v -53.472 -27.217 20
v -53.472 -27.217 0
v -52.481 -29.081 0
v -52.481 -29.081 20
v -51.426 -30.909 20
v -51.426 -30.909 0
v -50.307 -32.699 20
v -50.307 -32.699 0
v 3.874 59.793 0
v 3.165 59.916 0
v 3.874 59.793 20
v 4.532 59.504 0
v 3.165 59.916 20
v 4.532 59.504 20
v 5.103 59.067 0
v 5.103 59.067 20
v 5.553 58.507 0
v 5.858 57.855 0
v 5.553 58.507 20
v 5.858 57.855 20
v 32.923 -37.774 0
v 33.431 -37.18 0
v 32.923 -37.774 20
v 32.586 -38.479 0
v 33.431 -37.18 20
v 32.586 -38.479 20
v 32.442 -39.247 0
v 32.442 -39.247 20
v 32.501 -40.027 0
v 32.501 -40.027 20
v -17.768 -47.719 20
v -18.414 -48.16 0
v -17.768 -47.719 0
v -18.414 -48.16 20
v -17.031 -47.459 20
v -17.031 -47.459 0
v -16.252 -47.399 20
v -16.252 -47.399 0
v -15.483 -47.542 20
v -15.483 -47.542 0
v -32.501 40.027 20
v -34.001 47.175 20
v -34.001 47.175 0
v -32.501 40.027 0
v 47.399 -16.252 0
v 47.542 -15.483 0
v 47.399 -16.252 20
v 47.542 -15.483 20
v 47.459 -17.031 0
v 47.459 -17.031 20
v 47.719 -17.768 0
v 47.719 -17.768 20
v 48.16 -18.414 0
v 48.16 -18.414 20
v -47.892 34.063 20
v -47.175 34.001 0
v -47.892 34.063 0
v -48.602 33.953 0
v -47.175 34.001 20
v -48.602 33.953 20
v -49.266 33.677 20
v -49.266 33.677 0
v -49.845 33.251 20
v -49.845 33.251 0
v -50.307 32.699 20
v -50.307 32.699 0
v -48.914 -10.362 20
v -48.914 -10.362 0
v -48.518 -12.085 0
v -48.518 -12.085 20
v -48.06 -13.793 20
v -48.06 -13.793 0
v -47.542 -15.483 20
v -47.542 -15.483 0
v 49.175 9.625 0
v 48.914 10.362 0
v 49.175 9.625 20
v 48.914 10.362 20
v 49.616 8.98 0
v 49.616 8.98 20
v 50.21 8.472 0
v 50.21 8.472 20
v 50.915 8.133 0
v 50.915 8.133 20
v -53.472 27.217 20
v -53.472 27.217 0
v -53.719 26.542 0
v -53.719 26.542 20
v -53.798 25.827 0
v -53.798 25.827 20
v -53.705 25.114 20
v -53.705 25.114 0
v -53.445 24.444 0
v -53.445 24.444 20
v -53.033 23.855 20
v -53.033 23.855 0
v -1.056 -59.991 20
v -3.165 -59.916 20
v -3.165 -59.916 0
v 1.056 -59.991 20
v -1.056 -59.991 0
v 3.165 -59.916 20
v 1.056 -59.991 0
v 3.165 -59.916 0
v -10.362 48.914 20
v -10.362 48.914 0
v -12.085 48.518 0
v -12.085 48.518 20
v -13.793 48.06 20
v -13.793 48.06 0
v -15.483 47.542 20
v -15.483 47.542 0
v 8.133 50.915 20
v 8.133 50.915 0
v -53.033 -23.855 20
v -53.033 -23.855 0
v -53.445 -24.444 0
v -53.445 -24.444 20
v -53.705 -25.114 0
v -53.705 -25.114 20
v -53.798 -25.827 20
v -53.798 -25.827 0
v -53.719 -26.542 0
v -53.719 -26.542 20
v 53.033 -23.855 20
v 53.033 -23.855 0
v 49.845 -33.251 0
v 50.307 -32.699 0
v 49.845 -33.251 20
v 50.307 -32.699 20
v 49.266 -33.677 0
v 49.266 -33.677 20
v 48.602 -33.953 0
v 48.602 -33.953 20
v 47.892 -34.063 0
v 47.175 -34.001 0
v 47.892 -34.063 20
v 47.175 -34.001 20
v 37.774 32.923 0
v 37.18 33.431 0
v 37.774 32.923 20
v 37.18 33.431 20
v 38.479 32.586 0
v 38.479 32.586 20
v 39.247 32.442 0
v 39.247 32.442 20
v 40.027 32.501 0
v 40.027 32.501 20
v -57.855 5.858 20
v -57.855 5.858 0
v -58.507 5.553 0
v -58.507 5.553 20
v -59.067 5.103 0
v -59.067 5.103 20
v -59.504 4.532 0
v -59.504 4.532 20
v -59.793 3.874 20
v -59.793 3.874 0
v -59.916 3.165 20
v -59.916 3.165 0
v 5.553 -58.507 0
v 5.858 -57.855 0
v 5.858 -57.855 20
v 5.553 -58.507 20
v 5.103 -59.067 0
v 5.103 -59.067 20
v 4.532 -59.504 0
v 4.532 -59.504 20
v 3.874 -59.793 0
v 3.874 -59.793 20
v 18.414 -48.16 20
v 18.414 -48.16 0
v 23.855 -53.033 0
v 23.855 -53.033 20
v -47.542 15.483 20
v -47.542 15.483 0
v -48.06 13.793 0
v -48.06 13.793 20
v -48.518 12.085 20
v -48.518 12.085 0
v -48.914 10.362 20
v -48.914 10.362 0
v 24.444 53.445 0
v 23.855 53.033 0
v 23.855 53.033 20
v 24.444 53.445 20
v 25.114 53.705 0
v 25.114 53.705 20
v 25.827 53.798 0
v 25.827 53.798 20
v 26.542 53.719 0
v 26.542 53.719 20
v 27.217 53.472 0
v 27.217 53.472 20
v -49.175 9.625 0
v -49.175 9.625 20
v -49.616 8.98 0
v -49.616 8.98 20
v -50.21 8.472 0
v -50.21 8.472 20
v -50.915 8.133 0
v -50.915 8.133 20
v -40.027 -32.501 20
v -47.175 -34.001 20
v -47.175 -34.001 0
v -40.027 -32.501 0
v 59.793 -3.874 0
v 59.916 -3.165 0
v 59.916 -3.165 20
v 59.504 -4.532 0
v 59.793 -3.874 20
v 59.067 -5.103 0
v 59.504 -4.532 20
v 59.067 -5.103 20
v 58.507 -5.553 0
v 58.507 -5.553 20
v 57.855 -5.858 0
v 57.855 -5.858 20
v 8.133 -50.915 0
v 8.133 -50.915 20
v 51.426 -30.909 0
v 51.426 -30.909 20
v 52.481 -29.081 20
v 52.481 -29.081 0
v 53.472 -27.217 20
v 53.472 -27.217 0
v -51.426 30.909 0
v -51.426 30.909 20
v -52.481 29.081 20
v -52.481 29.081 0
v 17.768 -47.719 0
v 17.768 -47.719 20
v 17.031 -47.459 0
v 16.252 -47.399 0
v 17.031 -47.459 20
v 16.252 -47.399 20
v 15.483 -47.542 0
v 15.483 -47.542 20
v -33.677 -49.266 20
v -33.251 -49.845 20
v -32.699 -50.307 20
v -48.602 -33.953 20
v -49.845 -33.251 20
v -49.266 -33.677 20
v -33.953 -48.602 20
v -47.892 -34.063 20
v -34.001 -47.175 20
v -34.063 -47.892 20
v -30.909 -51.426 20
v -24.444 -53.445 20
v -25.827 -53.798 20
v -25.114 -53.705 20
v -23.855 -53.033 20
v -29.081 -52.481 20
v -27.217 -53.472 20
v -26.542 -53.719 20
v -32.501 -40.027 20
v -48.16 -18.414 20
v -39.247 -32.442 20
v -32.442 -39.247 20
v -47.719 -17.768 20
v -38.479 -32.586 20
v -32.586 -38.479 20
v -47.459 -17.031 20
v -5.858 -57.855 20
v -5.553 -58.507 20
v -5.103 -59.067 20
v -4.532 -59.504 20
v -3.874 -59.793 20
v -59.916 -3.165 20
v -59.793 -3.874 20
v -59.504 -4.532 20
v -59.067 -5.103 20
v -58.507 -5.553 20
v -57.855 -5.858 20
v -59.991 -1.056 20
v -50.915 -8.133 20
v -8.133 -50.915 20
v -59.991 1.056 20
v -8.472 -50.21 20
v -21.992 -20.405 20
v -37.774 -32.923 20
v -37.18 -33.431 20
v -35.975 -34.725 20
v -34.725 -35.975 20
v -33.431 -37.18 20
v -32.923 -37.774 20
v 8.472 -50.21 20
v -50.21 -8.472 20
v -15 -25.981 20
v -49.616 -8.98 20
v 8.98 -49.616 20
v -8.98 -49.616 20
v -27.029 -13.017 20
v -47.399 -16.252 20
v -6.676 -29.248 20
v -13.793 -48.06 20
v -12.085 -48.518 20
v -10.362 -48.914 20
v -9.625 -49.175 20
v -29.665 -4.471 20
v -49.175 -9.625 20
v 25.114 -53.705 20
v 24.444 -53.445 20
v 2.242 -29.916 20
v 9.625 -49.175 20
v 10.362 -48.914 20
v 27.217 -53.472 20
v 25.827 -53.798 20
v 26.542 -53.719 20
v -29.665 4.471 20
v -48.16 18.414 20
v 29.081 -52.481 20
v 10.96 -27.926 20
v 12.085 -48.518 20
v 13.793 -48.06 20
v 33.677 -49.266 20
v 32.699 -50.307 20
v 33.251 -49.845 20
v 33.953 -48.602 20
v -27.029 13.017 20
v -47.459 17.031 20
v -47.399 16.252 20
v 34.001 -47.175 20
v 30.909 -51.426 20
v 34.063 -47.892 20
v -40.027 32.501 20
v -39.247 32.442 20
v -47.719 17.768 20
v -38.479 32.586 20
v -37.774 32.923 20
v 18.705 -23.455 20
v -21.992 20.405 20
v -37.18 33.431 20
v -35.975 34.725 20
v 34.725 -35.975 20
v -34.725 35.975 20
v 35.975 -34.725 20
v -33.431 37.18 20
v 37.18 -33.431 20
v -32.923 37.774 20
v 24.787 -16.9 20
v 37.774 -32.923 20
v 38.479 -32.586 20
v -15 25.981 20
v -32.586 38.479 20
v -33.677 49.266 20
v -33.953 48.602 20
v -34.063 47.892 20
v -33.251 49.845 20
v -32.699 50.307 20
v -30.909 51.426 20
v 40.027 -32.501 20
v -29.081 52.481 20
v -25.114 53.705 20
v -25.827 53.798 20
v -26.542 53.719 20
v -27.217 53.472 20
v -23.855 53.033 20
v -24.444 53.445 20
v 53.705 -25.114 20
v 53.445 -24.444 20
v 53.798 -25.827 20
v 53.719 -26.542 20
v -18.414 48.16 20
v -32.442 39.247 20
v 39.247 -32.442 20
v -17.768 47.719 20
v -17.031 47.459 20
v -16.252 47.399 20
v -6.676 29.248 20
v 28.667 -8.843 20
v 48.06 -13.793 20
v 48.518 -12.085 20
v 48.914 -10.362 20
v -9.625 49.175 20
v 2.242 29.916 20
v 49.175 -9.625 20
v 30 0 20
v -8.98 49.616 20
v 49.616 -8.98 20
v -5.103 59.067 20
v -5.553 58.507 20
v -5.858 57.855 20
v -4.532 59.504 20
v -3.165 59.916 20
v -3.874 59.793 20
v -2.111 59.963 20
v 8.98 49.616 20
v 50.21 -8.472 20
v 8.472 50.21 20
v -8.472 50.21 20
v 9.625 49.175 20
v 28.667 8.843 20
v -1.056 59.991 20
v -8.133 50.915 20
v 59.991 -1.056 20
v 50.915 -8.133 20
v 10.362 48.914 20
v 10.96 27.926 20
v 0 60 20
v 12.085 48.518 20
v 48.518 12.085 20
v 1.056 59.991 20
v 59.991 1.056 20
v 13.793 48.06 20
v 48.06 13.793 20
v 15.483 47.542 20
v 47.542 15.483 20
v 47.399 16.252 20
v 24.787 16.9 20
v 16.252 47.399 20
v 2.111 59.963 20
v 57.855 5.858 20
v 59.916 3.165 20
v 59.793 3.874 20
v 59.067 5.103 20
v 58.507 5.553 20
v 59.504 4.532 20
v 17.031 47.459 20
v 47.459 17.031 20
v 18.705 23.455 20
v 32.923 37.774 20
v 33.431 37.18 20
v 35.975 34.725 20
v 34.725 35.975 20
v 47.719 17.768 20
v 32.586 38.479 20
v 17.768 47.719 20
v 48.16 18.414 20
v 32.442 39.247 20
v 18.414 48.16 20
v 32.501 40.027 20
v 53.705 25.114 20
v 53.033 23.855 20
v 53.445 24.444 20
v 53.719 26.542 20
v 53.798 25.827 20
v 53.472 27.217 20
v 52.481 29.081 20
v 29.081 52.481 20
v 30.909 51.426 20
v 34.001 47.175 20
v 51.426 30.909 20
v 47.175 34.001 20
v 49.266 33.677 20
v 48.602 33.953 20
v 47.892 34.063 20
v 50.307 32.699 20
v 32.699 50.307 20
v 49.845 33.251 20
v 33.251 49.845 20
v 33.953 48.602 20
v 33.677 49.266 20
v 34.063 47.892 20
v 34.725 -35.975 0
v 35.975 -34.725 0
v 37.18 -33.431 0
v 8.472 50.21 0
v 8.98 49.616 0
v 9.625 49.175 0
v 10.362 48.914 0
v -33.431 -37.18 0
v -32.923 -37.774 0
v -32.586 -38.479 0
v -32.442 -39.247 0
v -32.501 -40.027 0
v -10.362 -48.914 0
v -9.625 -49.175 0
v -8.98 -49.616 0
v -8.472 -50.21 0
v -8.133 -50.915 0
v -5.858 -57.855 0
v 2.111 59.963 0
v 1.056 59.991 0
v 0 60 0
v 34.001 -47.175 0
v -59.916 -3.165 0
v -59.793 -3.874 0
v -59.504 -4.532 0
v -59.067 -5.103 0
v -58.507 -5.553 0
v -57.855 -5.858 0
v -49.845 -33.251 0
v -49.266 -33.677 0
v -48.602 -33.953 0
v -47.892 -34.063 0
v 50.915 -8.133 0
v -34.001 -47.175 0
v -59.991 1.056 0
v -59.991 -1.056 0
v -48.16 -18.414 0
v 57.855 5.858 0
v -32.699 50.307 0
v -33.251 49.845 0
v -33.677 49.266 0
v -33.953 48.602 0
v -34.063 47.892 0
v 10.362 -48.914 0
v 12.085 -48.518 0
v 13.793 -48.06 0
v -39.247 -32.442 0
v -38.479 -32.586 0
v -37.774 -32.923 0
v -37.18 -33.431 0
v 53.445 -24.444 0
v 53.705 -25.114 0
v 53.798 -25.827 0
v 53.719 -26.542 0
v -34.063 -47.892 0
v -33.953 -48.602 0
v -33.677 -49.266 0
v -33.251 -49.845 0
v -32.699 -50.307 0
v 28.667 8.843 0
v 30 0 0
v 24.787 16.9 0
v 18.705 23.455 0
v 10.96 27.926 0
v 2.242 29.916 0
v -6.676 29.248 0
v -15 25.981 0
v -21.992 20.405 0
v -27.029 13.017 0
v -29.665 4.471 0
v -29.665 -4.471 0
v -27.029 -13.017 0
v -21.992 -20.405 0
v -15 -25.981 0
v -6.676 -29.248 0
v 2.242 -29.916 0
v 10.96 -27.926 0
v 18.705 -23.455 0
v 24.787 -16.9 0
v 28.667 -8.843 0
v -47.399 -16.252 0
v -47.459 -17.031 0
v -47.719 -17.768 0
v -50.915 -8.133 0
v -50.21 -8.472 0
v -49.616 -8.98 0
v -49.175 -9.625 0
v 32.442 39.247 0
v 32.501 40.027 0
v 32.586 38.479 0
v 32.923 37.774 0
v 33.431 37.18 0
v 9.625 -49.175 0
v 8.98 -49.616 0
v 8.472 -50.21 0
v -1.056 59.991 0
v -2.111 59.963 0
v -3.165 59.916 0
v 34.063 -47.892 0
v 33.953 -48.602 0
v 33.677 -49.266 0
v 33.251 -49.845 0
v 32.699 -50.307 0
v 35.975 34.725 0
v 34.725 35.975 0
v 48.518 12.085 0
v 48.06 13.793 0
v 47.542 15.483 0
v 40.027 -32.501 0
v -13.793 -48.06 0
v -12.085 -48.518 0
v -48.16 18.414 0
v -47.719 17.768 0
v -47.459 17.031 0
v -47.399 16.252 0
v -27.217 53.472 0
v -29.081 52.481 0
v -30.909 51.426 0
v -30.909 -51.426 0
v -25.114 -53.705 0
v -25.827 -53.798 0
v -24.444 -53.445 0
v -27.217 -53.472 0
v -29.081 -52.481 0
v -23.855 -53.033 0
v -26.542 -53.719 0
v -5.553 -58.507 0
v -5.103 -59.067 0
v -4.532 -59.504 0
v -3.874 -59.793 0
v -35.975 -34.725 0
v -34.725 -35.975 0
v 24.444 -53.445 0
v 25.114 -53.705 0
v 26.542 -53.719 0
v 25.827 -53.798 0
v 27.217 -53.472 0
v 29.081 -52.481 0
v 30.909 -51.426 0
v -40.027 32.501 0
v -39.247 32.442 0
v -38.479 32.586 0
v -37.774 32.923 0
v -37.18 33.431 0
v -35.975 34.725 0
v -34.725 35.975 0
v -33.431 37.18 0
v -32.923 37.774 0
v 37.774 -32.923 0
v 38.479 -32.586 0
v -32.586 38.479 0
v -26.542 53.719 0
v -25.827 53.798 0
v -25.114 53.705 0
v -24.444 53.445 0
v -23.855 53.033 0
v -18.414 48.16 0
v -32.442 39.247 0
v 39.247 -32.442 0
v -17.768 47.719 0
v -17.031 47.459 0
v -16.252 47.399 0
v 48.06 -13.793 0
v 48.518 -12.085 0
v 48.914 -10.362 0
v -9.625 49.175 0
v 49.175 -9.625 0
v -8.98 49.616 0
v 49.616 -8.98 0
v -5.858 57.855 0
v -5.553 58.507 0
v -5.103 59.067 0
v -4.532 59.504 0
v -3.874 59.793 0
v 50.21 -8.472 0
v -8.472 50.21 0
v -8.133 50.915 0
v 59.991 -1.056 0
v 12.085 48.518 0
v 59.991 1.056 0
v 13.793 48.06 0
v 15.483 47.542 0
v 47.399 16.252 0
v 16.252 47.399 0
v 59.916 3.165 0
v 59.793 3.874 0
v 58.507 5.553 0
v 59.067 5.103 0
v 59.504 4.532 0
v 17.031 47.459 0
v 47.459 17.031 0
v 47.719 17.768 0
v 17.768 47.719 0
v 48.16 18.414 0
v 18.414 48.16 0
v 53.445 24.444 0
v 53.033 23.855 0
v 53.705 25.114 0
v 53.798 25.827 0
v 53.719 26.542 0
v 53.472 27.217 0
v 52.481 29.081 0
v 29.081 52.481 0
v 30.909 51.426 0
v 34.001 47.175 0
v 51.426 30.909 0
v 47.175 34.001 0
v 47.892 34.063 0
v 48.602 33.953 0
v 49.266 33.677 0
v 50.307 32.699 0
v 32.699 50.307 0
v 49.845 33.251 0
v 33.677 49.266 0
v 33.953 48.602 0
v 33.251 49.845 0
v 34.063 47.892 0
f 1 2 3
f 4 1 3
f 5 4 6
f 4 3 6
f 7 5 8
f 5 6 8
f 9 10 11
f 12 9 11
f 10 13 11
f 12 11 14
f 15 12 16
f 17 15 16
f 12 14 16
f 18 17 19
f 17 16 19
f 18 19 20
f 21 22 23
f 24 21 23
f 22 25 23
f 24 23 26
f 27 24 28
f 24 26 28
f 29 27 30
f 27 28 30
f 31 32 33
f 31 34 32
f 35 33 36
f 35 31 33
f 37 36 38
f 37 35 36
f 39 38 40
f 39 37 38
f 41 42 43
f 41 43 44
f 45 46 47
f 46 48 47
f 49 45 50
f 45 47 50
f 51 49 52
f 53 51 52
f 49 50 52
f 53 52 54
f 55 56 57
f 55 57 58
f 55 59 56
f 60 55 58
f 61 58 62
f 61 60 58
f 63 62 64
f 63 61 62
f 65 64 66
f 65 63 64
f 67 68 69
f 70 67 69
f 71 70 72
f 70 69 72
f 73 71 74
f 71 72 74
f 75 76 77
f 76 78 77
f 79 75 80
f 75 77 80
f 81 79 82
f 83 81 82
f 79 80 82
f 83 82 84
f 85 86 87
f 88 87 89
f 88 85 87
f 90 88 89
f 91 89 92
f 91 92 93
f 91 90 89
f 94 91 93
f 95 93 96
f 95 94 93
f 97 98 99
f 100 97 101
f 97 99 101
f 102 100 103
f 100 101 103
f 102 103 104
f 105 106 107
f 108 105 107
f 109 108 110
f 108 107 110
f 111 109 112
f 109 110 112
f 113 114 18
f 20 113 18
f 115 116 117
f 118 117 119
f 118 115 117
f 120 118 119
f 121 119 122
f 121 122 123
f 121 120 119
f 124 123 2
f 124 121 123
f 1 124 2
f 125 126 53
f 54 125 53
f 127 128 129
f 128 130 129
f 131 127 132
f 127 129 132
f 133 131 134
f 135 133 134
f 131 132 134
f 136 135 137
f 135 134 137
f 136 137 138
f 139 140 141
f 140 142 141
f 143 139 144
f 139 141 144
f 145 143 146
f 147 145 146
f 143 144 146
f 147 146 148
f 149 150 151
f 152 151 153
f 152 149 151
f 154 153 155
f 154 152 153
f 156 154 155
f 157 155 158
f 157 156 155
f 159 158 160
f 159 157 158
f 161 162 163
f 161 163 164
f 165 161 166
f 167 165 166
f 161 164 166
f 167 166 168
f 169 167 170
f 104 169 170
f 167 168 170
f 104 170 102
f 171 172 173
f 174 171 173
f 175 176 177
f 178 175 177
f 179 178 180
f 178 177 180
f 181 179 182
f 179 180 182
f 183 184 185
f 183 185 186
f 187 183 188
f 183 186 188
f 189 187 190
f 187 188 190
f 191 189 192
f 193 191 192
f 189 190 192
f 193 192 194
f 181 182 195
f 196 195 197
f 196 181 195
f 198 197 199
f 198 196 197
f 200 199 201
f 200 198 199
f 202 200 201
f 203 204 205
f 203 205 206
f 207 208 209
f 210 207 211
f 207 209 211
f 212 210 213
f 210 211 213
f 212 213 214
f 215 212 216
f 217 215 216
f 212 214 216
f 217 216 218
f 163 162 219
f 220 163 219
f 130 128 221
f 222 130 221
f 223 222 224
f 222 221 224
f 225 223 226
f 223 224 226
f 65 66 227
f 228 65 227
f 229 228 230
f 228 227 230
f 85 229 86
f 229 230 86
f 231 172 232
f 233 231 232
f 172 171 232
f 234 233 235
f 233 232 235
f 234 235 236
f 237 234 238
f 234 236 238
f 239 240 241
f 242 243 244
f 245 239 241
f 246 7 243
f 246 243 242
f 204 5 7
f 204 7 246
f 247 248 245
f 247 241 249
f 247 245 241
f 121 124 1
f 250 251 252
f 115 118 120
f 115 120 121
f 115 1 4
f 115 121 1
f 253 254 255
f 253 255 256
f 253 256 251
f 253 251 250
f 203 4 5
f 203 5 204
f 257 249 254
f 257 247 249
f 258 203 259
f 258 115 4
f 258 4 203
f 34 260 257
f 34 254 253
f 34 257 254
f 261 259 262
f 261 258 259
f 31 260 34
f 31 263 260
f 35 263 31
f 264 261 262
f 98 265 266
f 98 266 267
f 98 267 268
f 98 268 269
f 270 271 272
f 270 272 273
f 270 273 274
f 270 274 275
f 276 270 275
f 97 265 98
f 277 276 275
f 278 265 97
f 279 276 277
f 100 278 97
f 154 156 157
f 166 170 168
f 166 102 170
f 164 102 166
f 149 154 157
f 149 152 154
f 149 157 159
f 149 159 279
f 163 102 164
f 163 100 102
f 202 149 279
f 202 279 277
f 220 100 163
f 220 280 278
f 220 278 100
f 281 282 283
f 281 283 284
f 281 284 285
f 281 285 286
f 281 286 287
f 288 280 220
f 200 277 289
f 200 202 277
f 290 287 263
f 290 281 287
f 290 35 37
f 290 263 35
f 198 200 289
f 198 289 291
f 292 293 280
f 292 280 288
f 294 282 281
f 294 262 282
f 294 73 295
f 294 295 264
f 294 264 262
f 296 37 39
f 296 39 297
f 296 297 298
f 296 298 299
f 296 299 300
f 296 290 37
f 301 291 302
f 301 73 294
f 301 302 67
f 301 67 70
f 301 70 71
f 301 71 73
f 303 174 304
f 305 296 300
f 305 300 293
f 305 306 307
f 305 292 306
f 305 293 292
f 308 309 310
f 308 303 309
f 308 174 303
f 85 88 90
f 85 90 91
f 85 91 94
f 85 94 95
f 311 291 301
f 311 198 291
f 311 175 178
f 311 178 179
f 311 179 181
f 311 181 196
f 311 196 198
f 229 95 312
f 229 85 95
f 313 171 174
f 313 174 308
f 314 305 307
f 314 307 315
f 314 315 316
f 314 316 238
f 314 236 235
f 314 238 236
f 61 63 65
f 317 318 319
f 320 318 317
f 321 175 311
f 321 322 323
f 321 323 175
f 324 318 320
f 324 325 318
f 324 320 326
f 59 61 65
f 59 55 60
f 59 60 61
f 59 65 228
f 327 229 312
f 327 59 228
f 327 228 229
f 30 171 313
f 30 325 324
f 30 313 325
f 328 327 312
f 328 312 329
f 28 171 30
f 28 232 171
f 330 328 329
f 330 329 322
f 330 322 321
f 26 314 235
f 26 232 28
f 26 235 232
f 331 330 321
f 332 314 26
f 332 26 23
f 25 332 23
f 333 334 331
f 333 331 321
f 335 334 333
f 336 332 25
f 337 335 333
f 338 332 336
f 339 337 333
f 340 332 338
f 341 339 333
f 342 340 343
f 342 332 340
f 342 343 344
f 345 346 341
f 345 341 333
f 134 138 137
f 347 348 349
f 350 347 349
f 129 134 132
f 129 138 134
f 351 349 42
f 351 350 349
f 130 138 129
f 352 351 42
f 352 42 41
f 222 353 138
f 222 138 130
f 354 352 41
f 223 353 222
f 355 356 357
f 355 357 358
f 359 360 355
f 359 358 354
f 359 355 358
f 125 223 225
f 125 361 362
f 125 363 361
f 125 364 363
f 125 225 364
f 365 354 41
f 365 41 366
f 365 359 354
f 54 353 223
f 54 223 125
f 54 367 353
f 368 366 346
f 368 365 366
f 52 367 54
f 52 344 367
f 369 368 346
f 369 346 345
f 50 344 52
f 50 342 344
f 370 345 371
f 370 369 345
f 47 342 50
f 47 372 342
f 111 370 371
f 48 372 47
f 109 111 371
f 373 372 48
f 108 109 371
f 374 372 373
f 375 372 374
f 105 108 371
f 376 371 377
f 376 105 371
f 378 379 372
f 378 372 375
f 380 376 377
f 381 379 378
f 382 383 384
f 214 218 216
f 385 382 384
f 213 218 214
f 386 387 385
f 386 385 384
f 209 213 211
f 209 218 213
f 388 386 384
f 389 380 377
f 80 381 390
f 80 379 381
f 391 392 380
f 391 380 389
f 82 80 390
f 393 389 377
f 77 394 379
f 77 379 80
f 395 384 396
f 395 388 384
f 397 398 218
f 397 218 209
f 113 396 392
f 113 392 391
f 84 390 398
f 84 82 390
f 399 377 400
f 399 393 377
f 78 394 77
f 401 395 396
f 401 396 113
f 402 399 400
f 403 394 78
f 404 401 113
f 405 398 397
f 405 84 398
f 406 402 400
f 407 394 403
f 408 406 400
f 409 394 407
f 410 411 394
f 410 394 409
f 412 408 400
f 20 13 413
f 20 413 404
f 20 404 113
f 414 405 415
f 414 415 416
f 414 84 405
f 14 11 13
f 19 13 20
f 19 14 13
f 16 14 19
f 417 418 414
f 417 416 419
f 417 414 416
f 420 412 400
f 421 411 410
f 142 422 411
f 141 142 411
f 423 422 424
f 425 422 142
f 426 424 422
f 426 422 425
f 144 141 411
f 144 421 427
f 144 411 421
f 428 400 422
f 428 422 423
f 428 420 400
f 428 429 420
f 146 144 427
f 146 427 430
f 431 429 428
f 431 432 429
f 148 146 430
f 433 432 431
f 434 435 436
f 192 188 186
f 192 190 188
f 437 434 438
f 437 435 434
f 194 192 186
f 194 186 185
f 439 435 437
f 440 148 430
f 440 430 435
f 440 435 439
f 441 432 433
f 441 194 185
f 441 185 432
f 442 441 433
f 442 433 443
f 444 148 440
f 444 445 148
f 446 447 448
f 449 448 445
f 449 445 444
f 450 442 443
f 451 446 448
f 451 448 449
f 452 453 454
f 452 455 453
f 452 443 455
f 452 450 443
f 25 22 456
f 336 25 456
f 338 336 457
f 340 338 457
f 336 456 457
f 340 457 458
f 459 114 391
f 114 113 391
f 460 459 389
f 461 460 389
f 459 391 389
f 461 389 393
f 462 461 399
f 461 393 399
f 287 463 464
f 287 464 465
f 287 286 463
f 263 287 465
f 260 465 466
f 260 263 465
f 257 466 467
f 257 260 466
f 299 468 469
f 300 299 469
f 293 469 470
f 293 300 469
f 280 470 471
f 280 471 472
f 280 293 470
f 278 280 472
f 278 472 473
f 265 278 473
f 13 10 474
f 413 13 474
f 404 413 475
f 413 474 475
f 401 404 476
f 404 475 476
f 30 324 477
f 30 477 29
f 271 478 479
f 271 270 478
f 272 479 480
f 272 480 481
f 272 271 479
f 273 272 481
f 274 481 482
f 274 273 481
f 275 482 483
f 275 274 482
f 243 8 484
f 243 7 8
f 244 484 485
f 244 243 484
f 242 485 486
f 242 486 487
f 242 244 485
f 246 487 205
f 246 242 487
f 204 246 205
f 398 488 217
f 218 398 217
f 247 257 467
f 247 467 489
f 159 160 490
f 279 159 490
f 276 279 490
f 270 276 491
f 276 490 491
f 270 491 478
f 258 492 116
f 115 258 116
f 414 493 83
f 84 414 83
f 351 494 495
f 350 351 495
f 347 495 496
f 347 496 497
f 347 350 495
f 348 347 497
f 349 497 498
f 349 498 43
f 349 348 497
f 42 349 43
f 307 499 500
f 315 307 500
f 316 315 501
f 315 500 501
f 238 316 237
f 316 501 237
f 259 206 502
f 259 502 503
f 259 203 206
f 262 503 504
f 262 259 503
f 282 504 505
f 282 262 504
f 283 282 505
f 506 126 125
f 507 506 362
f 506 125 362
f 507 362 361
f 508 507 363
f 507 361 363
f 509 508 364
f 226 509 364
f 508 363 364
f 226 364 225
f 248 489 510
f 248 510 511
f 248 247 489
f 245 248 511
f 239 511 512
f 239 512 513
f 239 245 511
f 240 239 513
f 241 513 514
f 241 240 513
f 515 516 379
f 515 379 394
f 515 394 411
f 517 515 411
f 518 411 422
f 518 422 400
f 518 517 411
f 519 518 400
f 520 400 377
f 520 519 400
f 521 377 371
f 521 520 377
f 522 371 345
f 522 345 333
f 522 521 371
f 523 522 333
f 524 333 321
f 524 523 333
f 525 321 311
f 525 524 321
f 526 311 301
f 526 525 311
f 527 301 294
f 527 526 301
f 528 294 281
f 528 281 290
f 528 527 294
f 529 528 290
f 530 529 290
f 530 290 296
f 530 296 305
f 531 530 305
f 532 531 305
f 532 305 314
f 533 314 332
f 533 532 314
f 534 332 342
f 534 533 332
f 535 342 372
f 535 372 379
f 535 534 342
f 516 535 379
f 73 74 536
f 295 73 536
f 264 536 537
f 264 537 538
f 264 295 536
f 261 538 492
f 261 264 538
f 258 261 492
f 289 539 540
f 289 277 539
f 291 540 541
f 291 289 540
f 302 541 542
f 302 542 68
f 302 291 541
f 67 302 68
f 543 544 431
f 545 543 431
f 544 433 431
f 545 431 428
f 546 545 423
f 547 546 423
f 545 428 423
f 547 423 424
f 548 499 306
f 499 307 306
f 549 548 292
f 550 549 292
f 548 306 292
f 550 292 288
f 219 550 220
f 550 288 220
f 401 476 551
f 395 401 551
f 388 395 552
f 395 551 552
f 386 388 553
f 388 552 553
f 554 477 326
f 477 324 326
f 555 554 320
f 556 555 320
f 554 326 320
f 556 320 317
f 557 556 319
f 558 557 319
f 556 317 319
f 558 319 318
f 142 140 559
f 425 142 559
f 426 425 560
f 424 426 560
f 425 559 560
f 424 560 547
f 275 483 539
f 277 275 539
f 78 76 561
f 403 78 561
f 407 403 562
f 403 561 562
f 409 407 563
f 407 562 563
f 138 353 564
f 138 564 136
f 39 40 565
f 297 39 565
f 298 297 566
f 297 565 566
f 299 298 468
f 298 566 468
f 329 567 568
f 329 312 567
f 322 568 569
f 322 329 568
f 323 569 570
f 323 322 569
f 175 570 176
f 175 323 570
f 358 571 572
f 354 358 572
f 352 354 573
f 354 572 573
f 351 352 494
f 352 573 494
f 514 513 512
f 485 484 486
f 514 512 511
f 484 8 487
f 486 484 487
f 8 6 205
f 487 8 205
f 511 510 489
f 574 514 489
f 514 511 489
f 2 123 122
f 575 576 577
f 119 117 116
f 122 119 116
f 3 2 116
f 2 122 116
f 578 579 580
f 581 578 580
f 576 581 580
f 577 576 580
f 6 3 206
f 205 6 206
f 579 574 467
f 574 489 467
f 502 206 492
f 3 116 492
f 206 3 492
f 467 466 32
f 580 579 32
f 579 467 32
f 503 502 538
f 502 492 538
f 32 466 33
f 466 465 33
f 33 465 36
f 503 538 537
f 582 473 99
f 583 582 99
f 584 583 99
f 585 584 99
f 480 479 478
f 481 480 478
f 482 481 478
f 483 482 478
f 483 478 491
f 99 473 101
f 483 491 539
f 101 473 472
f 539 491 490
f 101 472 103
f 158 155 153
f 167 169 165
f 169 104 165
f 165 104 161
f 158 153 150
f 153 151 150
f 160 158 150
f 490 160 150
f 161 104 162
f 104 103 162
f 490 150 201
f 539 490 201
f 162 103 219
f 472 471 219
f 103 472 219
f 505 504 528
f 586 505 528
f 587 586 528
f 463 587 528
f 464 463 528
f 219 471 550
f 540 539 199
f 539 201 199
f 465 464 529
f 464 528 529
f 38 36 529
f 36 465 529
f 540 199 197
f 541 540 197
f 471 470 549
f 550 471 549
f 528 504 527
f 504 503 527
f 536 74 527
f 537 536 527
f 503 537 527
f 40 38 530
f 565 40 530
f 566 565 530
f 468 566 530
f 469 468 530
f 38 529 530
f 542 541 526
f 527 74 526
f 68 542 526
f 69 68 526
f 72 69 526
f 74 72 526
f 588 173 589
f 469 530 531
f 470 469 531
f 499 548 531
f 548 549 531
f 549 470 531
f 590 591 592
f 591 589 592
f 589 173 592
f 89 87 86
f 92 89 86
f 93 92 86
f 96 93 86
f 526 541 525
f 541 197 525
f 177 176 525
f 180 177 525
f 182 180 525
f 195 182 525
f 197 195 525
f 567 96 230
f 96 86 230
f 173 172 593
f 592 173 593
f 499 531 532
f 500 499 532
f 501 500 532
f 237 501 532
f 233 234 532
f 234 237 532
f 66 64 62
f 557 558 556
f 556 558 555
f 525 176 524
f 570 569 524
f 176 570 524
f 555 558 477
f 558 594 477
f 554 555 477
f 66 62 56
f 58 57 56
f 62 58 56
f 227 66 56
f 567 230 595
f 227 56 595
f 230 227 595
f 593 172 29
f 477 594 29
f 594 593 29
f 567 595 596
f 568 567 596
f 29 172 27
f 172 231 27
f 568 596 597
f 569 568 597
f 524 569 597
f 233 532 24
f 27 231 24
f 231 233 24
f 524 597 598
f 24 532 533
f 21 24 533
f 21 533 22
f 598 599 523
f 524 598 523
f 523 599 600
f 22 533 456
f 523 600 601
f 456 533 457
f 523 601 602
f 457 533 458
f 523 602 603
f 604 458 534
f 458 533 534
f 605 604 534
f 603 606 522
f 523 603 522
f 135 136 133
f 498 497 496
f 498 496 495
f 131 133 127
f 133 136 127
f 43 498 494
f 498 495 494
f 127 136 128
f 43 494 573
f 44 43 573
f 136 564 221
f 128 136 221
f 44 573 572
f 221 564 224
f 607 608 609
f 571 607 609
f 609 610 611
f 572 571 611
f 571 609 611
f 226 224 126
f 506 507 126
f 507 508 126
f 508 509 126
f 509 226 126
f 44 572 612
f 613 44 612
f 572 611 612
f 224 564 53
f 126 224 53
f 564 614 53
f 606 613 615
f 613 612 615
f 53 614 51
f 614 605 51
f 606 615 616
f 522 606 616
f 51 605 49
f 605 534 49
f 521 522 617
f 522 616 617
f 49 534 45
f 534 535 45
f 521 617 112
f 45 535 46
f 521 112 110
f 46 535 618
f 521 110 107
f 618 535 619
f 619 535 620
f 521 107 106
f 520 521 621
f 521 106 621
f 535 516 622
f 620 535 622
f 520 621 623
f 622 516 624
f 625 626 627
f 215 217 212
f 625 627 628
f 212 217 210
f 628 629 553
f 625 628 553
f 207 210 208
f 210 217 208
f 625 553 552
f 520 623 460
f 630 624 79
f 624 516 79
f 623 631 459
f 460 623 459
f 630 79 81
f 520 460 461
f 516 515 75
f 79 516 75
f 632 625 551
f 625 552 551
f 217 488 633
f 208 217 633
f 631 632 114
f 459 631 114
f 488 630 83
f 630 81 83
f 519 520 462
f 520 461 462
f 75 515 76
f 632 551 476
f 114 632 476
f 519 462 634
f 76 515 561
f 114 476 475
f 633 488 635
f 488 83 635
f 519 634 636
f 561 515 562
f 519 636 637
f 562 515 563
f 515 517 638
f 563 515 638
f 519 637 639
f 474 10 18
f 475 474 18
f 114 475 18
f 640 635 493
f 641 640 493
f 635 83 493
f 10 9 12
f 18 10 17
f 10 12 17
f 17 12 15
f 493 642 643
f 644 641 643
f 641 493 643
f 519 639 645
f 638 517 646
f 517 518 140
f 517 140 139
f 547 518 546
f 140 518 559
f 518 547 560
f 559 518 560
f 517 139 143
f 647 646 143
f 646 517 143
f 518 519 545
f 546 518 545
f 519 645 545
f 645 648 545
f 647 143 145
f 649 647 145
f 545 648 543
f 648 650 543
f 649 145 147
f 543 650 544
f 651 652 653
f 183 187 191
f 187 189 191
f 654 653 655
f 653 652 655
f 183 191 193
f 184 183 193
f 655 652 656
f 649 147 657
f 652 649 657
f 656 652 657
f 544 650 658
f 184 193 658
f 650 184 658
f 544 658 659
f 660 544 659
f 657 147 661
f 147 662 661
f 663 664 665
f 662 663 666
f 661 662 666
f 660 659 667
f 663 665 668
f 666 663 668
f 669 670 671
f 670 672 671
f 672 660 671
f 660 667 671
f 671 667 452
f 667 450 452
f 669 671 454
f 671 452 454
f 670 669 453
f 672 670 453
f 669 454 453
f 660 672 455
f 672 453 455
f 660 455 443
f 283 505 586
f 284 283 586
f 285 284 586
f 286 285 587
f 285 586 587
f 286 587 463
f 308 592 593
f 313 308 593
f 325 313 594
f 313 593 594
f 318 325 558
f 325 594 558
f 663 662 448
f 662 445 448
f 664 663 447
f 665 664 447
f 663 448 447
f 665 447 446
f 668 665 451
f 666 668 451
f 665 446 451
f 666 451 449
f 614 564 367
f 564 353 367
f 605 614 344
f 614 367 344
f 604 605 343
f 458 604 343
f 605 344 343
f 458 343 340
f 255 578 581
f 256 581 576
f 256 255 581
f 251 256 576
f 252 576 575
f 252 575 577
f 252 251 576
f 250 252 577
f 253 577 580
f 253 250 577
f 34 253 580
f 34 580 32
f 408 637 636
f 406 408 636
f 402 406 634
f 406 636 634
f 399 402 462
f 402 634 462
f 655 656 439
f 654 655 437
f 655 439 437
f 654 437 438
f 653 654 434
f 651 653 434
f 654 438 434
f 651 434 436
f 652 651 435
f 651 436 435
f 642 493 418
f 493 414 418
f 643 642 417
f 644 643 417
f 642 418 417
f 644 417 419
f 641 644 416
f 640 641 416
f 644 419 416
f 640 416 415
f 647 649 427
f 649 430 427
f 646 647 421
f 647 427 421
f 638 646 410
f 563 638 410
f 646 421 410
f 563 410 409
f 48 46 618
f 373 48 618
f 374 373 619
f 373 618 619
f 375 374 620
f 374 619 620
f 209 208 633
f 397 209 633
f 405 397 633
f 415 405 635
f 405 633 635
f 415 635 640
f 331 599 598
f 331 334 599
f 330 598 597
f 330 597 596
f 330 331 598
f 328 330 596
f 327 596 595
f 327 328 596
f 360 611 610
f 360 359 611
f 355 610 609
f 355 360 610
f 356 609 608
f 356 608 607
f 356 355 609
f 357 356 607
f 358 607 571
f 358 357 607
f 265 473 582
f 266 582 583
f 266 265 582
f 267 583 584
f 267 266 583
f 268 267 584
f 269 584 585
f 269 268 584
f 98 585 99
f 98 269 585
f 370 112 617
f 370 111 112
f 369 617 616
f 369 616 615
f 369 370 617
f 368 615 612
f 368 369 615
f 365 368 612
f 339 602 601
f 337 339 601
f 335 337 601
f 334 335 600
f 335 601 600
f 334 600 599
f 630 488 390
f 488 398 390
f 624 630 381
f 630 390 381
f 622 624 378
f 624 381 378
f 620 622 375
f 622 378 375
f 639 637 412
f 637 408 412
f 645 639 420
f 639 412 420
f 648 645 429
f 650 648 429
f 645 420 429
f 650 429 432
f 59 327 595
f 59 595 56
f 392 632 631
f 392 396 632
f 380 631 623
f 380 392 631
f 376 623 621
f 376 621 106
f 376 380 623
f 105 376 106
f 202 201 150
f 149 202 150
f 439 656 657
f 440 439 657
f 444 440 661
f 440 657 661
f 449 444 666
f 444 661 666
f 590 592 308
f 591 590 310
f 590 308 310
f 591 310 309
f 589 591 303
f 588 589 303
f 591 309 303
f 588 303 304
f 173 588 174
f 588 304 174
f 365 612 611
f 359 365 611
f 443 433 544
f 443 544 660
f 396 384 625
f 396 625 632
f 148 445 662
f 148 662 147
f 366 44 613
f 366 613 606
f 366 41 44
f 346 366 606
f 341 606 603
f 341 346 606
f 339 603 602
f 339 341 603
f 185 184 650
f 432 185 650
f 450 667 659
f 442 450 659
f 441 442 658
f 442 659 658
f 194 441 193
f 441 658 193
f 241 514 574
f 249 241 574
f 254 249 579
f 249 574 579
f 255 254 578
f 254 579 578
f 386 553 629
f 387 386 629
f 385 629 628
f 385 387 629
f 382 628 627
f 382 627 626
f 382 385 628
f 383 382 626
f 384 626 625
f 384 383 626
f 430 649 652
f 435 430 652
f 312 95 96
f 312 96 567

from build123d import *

# Parameters (mm, degrees)
SKETCH1_R           = 30
BOSS_EXTRUDE1_DEPTH = 20
FILLET1_R           = 3


with BuildPart() as part:
    # Sketch1 → Boss-Extrude1 (new body)
    with BuildSketch(Plane.XY):
        with BuildLine():
            ThreePointArc((0, 60), (-2.617163242, 59.942893295), (-5.229344565, 59.771681886))
            Line((-5.229344565, 59.771681886), (-8.682408883, 49.240387651))
            ThreePointArc((-8.682408883, 49.240387651), (-12.940952255, 48.296291314), (-17.101007166, 46.984631039))
            Line((-17.101007166, 46.984631039), (-25.357095704, 54.378467222))
            ThreePointArc((-25.357095704, 54.378467222), (-30, 51.961524227), (-34.414586181, 49.149122657))
            Line((-34.414586181, 49.149122657), (-32.139380484, 38.302222156))
            ThreePointArc((-32.139380484, 38.302222156), (-35.355339059, 35.355339059), (-38.302222156, 32.139380484))
            Line((-38.302222156, 32.139380484), (-49.149122657, 34.414586181))
            ThreePointArc((-49.149122657, 34.414586181), (-51.961524227, 30), (-54.378467222, 25.357095704))
            Line((-54.378467222, 25.357095704), (-46.984631039, 17.101007166))
            ThreePointArc((-46.984631039, 17.101007166), (-48.296291314, 12.940952255), (-49.240387651, 8.682408883))
            Line((-49.240387651, 8.682408883), (-59.771681886, 5.229344565))
            ThreePointArc((-59.771681886, 5.229344565), (-60, 0), (-59.771681886, -5.229344565))
            Line((-59.771681886, -5.229344565), (-49.240387651, -8.682408883))
            ThreePointArc((-49.240387651, -8.682408883), (-48.296291314, -12.940952255), (-46.984631039, -17.101007166))
            Line((-46.984631039, -17.101007166), (-54.378467222, -25.357095704))
            ThreePointArc((-54.378467222, -25.357095704), (-51.961524227, -30), (-49.149122657, -34.414586181))
            Line((-49.149122657, -34.414586181), (-38.302222156, -32.139380484))
            ThreePointArc((-38.302222156, -32.139380484), (-35.355339059, -35.355339059), (-32.139380484, -38.302222156))
            Line((-32.139380484, -38.302222156), (-34.414586181, -49.149122657))
            ThreePointArc((-34.414586181, -49.149122657), (-30, -51.961524227), (-25.357095704, -54.378467222))
            Line((-25.357095704, -54.378467222), (-17.101007166, -46.984631039))
            ThreePointArc((-17.101007166, -46.984631039), (-12.940952255, -48.296291314), (-8.682408883, -49.240387651))
            Line((-8.682408883, -49.240387651), (-5.229344565, -59.771681886))
            ThreePointArc((-5.229344565, -59.771681886), (0, -60), (5.229344565, -59.771681886))
            Line((5.229344565, -59.771681886), (8.682408883, -49.240387651))
            ThreePointArc((8.682408883, -49.240387651), (12.940952255, -48.296291314), (17.101007166, -46.984631039))
            Line((17.101007166, -46.984631039), (25.357095704, -54.378467222))
            ThreePointArc((25.357095704, -54.378467222), (30, -51.961524227), (34.414586181, -49.149122657))
            Line((34.414586181, -49.149122657), (32.139380484, -38.302222156))
            ThreePointArc((32.139380484, -38.302222156), (35.355339059, -35.355339059), (38.302222156, -32.139380484))
            Line((38.302222156, -32.139380484), (49.149122657, -34.414586181))
            ThreePointArc((49.149122657, -34.414586181), (51.961524227, -30), (54.378467222, -25.357095704))
            Line((54.378467222, -25.357095704), (46.984631039, -17.101007166))
            ThreePointArc((46.984631039, -17.101007166), (48.296291314, -12.940952255), (49.240387651, -8.682408883))
            Line((49.240387651, -8.682408883), (59.771681886, -5.229344565))
            ThreePointArc((59.771681886, -5.229344565), (60, 0), (59.771681886, 5.229344565))
            Line((59.771681886, 5.229344565), (49.240387651, 8.682408883))
            ThreePointArc((49.240387651, 8.682408883), (48.296291314, 12.940952255), (46.984631039, 17.101007166))
            Line((46.984631039, 17.101007166), (54.378467222, 25.357095704))
            ThreePointArc((54.378467222, 25.357095704), (51.961524227, 30), (49.149122657, 34.414586181))
            Line((49.149122657, 34.414586181), (38.302222156, 32.139380484))
            ThreePointArc((38.302222156, 32.139380484), (35.355339059, 35.355339059), (32.139380484, 38.302222156))
            Line((32.139380484, 38.302222156), (34.414586181, 49.149122657))
            ThreePointArc((34.414586181, 49.149122657), (30, 51.961524227), (25.357095704, 54.378467222))
            Line((25.357095704, 54.378467222), (17.101007166, 46.984631039))
            ThreePointArc((17.101007166, 46.984631039), (12.940952255, 48.296291314), (8.682408883, 49.240387651))
            Line((8.682408883, 49.240387651), (5.229344565, 59.771681886))
            ThreePointArc((5.229344565, 59.771681886), (2.617163242, 59.942893295), (0, 60))
        make_face()
        Circle(SKETCH1_R, mode=Mode.SUBTRACT)
    extrude(amount=BOSS_EXTRUDE1_DEPTH)

    # Fillet1
    fillet1_edges = [part.edges().sort_by_distance(p)[0] for p in [
        (-34.414586181, 49.149122657, 10),
        (-25.357095704, 54.378467222, 10),
        (-17.101007166, 46.984631039, 10),
        (-8.682408883, 49.240387651, 10),
        (-5.229344565, 59.771681886, 10),
        (5.229344565, 59.771681886, 10),
        (8.682408883, 49.240387651, 10),
        (17.101007166, 46.984631039, 10),
        (25.357095704, 54.378467222, 10),
        (34.414586181, 49.149122657, 10),
        (32.139380484, 38.302222156, 10),
        (38.302222156, 32.139380484, 10),
        (49.149122657, 34.414586181, 10),
        (54.378467222, 25.357095704, 10),
        (46.984631039, 17.101007166, 10),
        (49.240387651, 8.682408883, 10),
        (59.771681886, 5.229344565, 10),
        (59.771681886, -5.229344565, 10),
        (49.240387651, -8.682408883, 10),
        (46.984631039, -17.101007166, 10),
        (54.378467222, -25.357095704, 10),
        (49.149122657, -34.414586181, 10),
        (38.302222156, -32.139380484, 10),
        (32.139380484, -38.302222156, 10),
        (34.414586181, -49.149122657, 10),
        (25.357095704, -54.378467222, 10),
        (17.101007166, -46.984631039, 10),
        (8.682408883, -49.240387651, 10),
        (5.229344565, -59.771681886, 10),
        (-5.229344565, -59.771681886, 10),
        (-8.682408883, -49.240387651, 10),
        (-17.101007166, -46.984631039, 10),
        (-25.357095704, -54.378467222, 10),
        (-34.414586181, -49.149122657, 10),
        (-32.139380484, -38.302222156, 10),
        (-38.302222156, -32.139380484, 10),
        (-49.149122657, -34.414586181, 10),
        (-54.378467222, -25.357095704, 10),
        (-46.984631039, -17.101007166, 10),
        (-49.240387651, -8.682408883, 10),
        (-59.771681886, -5.229344565, 10),
        (-59.771681886, 5.229344565, 10),
        (-49.240387651, 8.682408883, 10),
        (-46.984631039, 17.101007166, 10),
        (-54.378467222, 25.357095704, 10),
        (-49.149122657, 34.414586181, 10),
        (-38.302222156, 32.139380484, 10),
        (-32.139380484, 38.302222156, 10),
    ]]
    fillet(fillet1_edges, radius=FILLET1_R)


solid = part.part
